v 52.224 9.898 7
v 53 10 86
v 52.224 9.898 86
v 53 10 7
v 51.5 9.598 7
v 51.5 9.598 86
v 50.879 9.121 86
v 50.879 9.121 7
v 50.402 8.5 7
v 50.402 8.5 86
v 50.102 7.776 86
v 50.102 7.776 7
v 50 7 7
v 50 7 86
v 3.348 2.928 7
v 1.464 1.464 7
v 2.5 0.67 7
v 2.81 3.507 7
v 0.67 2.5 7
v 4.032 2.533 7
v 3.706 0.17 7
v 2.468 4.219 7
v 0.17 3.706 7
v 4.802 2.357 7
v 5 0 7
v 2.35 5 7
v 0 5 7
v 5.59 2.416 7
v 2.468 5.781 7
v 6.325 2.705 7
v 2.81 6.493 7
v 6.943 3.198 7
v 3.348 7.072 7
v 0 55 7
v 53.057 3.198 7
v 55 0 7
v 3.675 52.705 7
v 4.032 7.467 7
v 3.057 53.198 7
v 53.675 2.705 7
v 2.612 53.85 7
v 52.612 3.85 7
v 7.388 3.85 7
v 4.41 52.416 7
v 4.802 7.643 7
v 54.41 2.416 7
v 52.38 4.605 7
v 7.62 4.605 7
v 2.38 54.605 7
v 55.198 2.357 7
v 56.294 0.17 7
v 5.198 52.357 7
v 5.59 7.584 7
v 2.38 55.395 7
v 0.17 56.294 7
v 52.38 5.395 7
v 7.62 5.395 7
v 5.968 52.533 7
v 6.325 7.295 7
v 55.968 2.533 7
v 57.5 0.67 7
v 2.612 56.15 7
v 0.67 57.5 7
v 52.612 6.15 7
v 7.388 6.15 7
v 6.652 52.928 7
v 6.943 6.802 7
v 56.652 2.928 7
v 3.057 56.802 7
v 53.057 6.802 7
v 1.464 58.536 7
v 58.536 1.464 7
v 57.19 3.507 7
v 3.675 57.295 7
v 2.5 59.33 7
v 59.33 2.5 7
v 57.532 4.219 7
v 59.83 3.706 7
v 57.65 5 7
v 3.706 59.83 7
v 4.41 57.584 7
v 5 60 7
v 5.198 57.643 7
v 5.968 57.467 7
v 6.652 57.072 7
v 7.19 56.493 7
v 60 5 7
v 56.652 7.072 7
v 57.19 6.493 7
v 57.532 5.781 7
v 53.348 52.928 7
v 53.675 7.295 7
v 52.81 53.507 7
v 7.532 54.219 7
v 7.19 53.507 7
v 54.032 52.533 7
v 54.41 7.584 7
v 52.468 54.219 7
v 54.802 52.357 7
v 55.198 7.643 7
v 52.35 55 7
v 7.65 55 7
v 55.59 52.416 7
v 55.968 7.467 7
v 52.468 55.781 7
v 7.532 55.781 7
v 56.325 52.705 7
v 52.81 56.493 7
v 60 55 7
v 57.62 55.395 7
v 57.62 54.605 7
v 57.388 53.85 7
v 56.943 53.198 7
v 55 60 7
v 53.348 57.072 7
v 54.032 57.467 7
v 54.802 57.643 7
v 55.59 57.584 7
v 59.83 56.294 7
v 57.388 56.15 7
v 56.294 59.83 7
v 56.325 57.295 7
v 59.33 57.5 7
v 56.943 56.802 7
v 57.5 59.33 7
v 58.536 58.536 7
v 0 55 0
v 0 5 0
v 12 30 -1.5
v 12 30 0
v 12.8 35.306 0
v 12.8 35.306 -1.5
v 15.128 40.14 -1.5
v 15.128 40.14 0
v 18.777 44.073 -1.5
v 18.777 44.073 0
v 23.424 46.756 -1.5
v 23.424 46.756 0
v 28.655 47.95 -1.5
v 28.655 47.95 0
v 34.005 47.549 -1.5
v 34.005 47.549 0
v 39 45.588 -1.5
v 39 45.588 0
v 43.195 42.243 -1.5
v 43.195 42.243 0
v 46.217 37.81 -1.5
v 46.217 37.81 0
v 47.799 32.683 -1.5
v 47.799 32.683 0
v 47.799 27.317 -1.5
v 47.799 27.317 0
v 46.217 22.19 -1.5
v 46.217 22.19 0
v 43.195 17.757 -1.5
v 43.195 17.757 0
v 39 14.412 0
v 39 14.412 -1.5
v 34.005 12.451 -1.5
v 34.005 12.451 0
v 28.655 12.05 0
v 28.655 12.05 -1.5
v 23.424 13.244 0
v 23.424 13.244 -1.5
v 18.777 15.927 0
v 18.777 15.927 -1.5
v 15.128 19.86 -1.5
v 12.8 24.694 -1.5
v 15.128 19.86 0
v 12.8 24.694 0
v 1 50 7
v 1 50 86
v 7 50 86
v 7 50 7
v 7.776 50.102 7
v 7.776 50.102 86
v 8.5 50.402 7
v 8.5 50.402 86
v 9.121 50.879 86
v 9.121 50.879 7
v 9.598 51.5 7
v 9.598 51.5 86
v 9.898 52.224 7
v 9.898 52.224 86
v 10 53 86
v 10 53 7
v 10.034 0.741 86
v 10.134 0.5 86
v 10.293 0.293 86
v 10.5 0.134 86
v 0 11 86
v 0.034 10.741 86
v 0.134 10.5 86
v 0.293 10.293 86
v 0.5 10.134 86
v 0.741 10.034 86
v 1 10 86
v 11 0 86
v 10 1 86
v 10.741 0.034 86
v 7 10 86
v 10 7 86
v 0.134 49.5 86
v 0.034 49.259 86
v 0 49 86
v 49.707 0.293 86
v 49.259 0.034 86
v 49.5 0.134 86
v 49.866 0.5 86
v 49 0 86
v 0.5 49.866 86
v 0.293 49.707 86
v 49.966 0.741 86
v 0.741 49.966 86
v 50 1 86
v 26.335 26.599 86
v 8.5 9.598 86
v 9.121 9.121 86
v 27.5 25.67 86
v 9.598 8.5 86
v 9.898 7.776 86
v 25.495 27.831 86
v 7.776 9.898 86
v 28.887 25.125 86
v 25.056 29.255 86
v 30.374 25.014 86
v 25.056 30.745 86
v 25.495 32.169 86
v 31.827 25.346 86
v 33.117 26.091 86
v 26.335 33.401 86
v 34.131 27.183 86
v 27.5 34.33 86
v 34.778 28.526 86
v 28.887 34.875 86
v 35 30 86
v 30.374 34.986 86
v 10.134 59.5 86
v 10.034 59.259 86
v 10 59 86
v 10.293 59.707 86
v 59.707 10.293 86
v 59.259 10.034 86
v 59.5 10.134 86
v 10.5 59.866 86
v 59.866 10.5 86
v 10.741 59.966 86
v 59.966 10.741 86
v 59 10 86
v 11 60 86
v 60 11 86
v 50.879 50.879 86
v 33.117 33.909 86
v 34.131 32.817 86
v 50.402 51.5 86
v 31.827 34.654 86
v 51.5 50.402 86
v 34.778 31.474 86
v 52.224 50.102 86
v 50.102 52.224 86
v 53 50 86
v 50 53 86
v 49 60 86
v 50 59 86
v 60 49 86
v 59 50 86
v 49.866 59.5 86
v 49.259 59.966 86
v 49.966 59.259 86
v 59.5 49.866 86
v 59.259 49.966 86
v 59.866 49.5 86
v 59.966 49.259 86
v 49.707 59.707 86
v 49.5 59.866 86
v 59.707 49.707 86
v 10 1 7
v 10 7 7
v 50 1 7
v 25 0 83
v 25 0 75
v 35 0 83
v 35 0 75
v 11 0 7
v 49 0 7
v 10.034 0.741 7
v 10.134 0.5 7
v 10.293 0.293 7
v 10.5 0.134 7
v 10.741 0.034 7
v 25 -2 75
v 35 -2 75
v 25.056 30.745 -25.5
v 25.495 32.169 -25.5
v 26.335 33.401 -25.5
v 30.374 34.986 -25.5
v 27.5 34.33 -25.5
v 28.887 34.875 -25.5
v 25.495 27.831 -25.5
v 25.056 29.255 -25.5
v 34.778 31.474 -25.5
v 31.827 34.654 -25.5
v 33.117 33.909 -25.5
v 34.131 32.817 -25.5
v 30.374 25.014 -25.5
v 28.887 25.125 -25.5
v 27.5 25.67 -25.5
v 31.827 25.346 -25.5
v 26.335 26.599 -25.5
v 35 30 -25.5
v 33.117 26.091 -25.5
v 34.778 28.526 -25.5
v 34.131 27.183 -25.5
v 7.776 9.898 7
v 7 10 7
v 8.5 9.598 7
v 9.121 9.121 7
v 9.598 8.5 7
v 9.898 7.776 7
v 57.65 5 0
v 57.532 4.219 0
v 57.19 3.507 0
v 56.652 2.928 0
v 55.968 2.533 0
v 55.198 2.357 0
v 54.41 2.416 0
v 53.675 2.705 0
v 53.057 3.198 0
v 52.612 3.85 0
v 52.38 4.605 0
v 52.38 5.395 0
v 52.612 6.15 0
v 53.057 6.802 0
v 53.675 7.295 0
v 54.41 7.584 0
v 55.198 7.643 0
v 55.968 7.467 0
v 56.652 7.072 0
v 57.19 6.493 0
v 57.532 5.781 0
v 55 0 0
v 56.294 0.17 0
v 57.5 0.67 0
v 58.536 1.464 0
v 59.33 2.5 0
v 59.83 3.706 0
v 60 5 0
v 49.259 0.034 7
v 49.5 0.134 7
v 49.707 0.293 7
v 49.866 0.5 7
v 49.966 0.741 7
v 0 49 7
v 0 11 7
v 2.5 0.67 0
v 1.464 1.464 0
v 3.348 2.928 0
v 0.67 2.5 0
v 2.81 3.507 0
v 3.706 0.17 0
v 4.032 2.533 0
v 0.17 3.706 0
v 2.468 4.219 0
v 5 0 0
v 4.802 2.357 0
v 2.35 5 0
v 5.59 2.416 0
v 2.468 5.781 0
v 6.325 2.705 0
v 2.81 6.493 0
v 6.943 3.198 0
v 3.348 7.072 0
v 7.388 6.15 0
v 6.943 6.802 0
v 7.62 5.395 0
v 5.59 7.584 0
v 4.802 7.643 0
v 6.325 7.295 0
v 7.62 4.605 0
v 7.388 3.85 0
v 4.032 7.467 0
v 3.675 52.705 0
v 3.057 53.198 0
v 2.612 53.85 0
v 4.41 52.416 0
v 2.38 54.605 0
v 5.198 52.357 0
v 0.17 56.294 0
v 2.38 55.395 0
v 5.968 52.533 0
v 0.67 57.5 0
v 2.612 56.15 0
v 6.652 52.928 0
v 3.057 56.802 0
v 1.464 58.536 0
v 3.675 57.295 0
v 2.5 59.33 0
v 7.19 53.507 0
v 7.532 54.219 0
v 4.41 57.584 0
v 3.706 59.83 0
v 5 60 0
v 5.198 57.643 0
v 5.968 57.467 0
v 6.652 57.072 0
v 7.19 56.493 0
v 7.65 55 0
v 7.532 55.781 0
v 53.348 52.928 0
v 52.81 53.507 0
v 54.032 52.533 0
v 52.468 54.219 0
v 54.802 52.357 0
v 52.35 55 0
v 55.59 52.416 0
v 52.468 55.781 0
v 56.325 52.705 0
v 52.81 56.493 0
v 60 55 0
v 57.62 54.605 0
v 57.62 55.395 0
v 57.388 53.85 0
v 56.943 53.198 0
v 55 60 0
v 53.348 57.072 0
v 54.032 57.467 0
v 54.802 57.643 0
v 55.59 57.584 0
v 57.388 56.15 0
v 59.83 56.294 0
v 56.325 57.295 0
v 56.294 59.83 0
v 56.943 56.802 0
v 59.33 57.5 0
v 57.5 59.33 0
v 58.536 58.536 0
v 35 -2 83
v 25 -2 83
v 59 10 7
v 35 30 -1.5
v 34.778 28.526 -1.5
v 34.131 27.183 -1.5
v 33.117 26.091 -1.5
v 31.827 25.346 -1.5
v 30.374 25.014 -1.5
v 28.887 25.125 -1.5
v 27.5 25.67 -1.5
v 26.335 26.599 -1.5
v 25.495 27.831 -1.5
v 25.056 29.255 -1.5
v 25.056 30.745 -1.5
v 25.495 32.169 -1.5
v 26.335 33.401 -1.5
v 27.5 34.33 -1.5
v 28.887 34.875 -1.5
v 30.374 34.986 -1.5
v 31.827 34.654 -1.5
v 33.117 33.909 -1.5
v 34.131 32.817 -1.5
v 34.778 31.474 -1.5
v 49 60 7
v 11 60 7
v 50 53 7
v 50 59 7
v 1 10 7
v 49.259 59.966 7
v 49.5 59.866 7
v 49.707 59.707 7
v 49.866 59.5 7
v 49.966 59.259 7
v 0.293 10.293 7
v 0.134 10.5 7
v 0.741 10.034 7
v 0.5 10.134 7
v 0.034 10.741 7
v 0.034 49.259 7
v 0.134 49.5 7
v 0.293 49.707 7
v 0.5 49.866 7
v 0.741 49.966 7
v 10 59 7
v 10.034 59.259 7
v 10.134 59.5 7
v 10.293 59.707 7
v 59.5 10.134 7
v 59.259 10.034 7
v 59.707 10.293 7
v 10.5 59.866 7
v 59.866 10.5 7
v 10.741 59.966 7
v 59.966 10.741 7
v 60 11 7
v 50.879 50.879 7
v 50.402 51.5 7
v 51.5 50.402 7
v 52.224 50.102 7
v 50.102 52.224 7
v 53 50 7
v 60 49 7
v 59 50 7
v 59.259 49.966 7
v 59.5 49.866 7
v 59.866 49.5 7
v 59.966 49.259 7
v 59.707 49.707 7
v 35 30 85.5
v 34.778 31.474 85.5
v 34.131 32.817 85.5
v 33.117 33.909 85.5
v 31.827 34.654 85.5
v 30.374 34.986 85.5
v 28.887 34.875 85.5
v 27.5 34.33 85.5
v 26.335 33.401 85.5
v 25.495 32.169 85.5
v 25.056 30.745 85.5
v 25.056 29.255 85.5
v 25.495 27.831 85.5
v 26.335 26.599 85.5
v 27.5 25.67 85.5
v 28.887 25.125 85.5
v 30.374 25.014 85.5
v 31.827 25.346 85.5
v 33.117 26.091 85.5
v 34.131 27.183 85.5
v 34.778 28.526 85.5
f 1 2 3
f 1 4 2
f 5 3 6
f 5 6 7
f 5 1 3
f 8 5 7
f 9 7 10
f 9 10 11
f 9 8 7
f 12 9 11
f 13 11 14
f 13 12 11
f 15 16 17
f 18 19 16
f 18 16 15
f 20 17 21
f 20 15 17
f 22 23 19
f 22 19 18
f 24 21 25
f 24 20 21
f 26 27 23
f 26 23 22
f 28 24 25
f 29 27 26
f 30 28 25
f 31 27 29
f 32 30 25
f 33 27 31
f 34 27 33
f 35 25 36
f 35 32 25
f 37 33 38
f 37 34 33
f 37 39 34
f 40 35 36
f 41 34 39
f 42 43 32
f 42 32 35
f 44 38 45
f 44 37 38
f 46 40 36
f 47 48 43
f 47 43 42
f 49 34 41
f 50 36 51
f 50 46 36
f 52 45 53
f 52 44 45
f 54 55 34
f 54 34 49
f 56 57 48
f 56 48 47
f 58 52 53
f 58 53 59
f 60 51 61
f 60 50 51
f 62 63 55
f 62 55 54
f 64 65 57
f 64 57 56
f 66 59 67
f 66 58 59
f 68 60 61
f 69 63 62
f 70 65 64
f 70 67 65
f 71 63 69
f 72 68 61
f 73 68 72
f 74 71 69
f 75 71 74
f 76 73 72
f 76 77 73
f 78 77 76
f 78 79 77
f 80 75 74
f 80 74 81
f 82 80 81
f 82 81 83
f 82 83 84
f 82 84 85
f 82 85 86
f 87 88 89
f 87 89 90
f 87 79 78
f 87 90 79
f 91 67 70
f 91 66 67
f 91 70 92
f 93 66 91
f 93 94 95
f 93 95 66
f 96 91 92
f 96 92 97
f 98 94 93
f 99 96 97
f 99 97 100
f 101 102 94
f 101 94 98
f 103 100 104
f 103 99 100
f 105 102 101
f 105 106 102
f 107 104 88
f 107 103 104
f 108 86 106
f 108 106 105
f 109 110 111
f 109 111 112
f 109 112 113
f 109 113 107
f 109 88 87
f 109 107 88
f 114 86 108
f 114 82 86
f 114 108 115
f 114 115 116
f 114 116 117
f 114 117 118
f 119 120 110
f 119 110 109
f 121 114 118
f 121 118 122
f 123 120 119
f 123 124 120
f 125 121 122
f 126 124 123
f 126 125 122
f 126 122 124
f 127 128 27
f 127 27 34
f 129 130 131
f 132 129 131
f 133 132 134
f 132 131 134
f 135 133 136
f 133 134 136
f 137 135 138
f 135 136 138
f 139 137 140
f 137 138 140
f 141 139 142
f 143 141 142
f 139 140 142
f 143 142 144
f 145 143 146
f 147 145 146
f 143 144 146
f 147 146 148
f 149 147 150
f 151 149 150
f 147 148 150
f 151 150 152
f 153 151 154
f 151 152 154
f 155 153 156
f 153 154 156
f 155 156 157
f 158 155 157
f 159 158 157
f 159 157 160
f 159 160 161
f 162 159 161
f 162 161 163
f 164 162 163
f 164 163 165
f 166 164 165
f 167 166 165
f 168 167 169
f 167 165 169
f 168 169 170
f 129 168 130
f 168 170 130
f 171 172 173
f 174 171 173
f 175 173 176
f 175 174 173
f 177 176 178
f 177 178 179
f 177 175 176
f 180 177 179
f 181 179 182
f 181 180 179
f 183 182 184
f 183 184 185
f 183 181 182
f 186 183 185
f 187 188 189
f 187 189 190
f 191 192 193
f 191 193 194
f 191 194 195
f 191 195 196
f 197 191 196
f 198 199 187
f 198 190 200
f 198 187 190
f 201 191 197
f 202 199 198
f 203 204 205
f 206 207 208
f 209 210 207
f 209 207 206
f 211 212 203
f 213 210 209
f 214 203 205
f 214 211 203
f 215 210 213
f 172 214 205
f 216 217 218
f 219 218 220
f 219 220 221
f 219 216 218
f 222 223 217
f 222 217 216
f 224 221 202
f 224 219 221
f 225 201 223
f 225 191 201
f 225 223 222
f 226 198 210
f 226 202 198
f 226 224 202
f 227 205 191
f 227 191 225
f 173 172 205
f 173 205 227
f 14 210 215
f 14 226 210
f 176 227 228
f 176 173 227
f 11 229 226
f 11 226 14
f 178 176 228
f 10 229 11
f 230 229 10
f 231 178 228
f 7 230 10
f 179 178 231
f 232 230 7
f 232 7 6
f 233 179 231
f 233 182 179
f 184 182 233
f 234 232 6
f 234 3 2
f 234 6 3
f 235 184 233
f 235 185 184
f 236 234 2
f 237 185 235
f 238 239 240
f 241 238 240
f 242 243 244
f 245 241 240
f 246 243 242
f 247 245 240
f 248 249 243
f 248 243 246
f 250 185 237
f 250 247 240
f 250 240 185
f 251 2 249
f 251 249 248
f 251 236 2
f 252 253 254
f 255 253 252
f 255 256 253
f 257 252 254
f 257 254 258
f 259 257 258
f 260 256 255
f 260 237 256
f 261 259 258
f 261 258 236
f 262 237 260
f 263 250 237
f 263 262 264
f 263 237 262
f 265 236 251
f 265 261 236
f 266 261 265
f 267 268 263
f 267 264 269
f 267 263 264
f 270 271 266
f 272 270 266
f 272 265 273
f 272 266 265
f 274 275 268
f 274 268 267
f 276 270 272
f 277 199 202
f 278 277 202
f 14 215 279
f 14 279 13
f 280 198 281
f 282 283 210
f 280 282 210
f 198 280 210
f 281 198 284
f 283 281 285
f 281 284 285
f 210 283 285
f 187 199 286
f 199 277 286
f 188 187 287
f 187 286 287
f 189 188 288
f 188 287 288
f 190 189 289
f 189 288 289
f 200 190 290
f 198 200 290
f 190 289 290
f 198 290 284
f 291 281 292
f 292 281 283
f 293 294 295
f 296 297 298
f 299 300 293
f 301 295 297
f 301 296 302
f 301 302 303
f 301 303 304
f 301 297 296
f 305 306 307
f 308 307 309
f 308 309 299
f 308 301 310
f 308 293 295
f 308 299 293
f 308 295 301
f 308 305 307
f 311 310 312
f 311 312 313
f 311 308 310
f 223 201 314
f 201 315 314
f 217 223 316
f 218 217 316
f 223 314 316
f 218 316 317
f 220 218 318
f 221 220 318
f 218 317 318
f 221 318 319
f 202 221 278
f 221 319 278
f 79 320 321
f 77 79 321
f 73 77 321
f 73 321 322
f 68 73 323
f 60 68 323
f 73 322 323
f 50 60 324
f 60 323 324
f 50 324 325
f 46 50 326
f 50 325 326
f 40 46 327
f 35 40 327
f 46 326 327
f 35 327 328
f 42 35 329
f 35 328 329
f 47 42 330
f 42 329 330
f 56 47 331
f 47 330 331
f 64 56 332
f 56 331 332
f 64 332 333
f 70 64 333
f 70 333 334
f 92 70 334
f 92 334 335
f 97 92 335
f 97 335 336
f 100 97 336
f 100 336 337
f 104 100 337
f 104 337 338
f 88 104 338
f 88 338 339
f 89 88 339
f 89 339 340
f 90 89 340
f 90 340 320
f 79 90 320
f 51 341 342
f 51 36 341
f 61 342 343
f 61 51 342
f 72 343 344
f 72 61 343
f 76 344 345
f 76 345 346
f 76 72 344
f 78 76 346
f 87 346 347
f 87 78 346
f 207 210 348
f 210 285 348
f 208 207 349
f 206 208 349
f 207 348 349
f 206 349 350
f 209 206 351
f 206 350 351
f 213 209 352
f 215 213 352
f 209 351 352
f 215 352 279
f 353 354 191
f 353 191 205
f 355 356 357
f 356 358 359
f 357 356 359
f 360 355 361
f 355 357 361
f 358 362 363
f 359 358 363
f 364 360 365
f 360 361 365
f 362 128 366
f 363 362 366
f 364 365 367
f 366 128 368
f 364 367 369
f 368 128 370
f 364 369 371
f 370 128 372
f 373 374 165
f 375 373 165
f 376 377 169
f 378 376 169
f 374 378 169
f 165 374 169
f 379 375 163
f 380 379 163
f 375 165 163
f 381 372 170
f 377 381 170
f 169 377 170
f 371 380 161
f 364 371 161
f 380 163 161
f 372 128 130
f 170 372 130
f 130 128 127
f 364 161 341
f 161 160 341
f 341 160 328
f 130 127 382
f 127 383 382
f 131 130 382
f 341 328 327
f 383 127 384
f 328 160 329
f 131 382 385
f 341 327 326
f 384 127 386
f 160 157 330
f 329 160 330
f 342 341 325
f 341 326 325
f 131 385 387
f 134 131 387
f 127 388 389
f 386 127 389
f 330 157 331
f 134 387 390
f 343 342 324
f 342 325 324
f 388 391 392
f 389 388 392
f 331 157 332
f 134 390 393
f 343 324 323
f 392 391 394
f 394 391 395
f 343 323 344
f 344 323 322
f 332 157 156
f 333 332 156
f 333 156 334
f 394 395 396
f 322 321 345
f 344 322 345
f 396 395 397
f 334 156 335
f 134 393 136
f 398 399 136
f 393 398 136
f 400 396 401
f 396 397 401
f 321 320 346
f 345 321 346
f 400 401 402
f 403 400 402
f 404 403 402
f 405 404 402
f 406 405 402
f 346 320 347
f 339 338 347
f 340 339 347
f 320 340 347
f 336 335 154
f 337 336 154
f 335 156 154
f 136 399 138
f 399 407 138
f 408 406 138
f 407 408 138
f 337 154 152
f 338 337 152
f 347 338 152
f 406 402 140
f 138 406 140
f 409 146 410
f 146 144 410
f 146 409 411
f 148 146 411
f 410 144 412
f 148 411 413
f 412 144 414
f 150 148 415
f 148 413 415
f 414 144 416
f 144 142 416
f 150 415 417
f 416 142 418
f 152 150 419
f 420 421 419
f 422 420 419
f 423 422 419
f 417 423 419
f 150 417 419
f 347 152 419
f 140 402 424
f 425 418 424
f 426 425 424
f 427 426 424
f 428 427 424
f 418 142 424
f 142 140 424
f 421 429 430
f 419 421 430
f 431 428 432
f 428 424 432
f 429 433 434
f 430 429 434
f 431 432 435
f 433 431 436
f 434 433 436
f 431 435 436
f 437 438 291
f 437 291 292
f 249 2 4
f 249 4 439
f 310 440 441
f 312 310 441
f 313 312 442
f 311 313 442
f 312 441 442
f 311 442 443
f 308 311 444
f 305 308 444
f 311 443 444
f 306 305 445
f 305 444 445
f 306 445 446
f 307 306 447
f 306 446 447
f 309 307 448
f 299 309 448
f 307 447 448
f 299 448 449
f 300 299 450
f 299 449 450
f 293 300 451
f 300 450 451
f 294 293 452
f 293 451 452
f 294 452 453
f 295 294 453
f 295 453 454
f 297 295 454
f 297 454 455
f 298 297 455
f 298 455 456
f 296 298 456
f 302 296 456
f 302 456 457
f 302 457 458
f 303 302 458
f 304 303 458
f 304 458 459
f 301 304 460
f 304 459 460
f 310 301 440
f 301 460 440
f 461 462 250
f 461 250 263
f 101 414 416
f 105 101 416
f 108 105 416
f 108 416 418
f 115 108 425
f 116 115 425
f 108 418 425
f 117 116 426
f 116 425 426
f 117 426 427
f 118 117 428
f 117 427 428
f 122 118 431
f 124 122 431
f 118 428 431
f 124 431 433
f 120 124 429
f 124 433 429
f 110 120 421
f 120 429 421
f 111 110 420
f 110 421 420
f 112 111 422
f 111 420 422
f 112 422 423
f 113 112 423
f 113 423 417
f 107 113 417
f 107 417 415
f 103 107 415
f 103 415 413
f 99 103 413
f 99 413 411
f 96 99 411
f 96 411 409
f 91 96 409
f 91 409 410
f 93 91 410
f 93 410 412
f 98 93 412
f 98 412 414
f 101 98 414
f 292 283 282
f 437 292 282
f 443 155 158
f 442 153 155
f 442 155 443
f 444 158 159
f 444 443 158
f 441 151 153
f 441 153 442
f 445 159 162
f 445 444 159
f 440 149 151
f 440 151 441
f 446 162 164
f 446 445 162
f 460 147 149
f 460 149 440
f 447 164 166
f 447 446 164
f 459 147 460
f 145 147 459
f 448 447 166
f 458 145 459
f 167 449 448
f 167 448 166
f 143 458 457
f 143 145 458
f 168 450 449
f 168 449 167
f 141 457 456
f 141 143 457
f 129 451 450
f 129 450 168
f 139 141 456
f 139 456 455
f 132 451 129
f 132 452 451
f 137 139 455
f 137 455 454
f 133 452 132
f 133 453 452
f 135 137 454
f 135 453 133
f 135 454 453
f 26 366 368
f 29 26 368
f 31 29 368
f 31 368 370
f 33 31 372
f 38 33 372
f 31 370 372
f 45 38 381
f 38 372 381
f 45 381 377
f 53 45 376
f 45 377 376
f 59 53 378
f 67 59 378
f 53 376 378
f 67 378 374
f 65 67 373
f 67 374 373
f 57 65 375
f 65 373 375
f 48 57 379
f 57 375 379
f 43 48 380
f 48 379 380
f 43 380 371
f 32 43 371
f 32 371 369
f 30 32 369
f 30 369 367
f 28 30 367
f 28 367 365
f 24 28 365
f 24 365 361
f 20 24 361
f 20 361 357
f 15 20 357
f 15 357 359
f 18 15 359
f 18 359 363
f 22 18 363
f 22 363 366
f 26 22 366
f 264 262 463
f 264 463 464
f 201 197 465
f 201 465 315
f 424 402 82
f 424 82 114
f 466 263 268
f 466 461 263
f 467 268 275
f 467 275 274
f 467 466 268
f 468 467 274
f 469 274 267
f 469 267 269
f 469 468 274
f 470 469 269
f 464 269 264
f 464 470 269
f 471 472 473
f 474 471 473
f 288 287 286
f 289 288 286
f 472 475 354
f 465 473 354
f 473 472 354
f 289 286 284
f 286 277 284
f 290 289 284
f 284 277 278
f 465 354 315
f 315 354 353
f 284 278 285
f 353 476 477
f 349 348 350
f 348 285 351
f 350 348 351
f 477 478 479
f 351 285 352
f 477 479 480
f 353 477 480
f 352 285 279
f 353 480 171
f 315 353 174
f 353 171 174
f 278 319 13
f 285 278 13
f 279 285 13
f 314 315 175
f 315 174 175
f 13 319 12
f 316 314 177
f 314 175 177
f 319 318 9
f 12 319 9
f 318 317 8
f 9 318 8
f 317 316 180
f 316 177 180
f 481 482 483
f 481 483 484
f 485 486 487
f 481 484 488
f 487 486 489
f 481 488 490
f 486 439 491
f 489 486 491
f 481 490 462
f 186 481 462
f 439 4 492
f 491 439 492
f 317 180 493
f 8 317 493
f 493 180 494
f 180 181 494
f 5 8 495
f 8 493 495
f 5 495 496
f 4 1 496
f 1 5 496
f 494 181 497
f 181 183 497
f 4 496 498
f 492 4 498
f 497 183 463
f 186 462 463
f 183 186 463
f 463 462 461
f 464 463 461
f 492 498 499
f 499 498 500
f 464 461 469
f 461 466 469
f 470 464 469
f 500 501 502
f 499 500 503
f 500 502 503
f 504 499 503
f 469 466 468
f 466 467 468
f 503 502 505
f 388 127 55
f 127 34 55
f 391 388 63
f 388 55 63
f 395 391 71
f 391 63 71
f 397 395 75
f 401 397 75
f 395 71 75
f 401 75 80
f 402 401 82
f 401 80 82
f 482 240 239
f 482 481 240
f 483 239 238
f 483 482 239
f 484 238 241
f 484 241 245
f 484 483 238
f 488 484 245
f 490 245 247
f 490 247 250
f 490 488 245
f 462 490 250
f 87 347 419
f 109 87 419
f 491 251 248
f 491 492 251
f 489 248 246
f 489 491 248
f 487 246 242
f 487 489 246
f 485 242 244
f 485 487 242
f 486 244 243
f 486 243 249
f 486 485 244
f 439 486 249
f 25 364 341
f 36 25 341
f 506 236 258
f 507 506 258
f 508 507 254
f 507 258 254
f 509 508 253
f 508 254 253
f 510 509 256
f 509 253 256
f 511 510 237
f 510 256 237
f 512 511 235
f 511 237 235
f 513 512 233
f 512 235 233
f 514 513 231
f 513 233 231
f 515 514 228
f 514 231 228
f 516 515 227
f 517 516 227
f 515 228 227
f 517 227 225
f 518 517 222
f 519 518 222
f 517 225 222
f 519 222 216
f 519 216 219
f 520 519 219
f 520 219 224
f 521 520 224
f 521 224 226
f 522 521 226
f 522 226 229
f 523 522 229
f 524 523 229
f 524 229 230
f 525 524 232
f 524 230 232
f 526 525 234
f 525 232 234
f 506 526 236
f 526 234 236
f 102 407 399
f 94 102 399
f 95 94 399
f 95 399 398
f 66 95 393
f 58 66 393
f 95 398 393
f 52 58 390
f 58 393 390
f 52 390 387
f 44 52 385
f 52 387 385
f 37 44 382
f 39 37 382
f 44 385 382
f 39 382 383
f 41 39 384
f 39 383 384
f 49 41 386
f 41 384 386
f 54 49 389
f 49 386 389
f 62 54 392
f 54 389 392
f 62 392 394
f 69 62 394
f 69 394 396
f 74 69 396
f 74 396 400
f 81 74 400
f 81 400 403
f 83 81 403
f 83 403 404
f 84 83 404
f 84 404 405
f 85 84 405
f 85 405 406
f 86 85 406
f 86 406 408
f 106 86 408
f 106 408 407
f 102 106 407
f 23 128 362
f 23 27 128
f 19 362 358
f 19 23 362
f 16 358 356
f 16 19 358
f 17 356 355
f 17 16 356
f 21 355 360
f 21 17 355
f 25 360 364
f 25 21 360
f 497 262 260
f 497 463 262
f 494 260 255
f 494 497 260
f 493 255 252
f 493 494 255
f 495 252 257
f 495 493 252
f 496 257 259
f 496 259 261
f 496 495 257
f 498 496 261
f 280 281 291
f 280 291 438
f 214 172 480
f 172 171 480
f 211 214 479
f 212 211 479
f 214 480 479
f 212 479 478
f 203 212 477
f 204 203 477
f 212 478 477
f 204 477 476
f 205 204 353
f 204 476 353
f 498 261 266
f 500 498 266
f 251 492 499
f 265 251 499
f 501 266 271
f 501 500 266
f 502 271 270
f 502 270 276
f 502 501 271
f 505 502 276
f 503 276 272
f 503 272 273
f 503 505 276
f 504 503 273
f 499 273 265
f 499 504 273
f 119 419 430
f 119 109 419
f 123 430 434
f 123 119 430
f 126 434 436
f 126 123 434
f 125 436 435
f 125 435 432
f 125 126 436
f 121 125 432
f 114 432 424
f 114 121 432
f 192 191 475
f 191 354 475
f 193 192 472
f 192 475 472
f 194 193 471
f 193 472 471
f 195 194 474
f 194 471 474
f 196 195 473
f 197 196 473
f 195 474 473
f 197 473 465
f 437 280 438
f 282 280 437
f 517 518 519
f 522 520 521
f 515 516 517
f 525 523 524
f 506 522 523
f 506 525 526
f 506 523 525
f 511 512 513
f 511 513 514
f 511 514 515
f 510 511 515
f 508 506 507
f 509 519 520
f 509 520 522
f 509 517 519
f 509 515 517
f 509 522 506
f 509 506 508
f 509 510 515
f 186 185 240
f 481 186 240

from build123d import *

# Parameters (mm, degrees)
SKETCH_1_W          = 60
SKETCH_1_H          = 60
EXTRUDE_1_DEPTH     = 7
FILLET_1_R          = 5
SKETCH_3_R          = 2.65
CUT_EXTRUDE_1_DEPTH = 86.141059425
SKETCH_4_W          = 60
SKETCH_4_H          = 60
EXTRUDE_2_DEPTH     = 79
SKETCH_5_W          = 10
SKETCH_5_H          = 10
CUT_EXTRUDE_2_DEPTH = 79
FILLET_2_R          = 3
FILLET_3_R          = 1
SKETCH_6_R          = 5
CUT_EXTRUDE_3_DEPTH = 0.5
SKETCH_7_R          = 18
EXTRUDE_3_DEPTH     = 1.5
SKETCH_8_R          = 5
EXTRUDE_4_DEPTH     = 24
SKETCH_9_W          = 10
SKETCH_9_H          = 8
EXTRUDE_5_DEPTH     = 2


with BuildPart() as part:
    # 草图1 → 凸台-拉伸1 (new body)
    with BuildSketch(Plane.XY):
        with Locations((30, 30)):
            Rectangle(SKETCH_1_W, SKETCH_1_H)
    extrude(amount=EXTRUDE_1_DEPTH)

    # 圆角1
    fillet_1_edges = [part.edges().sort_by_distance(p)[0] for p in [
        (0, 60, 3.5),
        (60, 60, 3.5),
        (60, 0, 3.5),
        (0, 0, 3.5),
    ]]
    fillet(fillet_1_edges, radius=FILLET_1_R)

    # 草图3 → 切除-拉伸1 (cut, through all)
    with BuildSketch(Plane(origin=(0, 0, 0), x_dir=(-1, 0, 0), z_dir=(0, 0, -1))):
        with Locations((-55, 55)):
            Circle(SKETCH_3_R)
        with Locations(Location((-5, 55, 0), (0, 0, 180))):
            Circle(SKETCH_3_R)
        with Locations((-5, 5)):
            Circle(SKETCH_3_R)
        with Locations(Location((-55, 5, 0), (0, 0, 180))):
            Circle(SKETCH_3_R)
    extrude(amount=-CUT_EXTRUDE_1_DEPTH, mode=Mode.SUBTRACT)

    # 草图7 → 凸台-拉伸3 (add)
    with BuildSketch(Plane(origin=(0, 0, 0), x_dir=(-1, 0, 0), z_dir=(0, 0, -1))):
        with Locations((-30, 30)):
            Circle(SKETCH_7_R)
    extrude(amount=EXTRUDE_3_DEPTH)

    # 草图8 → 凸台-拉伸4 (add)
    with BuildSketch(Plane(origin=(0, 0, -1.5), x_dir=(-1, 0, 0), z_dir=(0, 0, -1))):
        with Locations(Location((-30, 30, 0), (0, 0, 180))):
            Circle(SKETCH_8_R)
    extrude(amount=EXTRUDE_4_DEPTH)


with BuildPart() as body_2:
    # 草图4 → 凸台-拉伸2 (new body)
    with BuildSketch(Plane.XY.offset(7)):
        with Locations((30, 30)):
            Rectangle(SKETCH_4_W, SKETCH_4_H)
    extrude(amount=EXTRUDE_2_DEPTH)

    # 草图5 → 切除-拉伸2 (cut)
    with BuildSketch(Plane.XY.offset(86)):
        with Locations((5, 55)):
            Rectangle(SKETCH_5_W, SKETCH_5_H)
        with Locations((5, 5)):
            Rectangle(SKETCH_5_W, SKETCH_5_H)
        with Locations((55, 5)):
            Rectangle(SKETCH_5_W, SKETCH_5_H)
        with Locations((55, 55)):
            Rectangle(SKETCH_5_W, SKETCH_5_H)
    extrude(amount=-CUT_EXTRUDE_2_DEPTH, mode=Mode.SUBTRACT)

    # 圆角2
    fillet_2_edges = [body_2.edges().sort_by_distance(p)[0] for p in [
        (10, 50, 46.5),
        (10, 10, 46.5),
        (50, 10, 46.5),
        (50, 50, 46.5),
    ]]
    fillet(fillet_2_edges, radius=FILLET_2_R)

    # 圆角3
    fillet_3_edges = [body_2.edges().sort_by_distance(p)[0] for p in [
        (0, 50, 46.5),
        (10, 60, 46.5),
        (10, 0, 46.5),
        (0, 10, 46.5),
        (60, 10, 46.5),
        (50, 0, 46.5),
        (50, 60, 46.5),
        (60, 50, 46.5),
    ]]
    fillet(fillet_3_edges, radius=FILLET_3_R)

    # 草图6 → 切除-拉伸3 (cut)
    with BuildSketch(Plane.XY.offset(86)):
        with Locations((30, 30)):
            Circle(SKETCH_6_R)
    extrude(amount=-CUT_EXTRUDE_3_DEPTH, mode=Mode.SUBTRACT)

    # 草图9 → 凸台-拉伸5 (add)
    with BuildSketch(Plane.XZ):
        with Locations((30, 79)):
            Rectangle(SKETCH_9_W, SKETCH_9_H)
    extrude(amount=EXTRUDE_5_DEPTH)


solid = Compound([part.part, body_2.part])
